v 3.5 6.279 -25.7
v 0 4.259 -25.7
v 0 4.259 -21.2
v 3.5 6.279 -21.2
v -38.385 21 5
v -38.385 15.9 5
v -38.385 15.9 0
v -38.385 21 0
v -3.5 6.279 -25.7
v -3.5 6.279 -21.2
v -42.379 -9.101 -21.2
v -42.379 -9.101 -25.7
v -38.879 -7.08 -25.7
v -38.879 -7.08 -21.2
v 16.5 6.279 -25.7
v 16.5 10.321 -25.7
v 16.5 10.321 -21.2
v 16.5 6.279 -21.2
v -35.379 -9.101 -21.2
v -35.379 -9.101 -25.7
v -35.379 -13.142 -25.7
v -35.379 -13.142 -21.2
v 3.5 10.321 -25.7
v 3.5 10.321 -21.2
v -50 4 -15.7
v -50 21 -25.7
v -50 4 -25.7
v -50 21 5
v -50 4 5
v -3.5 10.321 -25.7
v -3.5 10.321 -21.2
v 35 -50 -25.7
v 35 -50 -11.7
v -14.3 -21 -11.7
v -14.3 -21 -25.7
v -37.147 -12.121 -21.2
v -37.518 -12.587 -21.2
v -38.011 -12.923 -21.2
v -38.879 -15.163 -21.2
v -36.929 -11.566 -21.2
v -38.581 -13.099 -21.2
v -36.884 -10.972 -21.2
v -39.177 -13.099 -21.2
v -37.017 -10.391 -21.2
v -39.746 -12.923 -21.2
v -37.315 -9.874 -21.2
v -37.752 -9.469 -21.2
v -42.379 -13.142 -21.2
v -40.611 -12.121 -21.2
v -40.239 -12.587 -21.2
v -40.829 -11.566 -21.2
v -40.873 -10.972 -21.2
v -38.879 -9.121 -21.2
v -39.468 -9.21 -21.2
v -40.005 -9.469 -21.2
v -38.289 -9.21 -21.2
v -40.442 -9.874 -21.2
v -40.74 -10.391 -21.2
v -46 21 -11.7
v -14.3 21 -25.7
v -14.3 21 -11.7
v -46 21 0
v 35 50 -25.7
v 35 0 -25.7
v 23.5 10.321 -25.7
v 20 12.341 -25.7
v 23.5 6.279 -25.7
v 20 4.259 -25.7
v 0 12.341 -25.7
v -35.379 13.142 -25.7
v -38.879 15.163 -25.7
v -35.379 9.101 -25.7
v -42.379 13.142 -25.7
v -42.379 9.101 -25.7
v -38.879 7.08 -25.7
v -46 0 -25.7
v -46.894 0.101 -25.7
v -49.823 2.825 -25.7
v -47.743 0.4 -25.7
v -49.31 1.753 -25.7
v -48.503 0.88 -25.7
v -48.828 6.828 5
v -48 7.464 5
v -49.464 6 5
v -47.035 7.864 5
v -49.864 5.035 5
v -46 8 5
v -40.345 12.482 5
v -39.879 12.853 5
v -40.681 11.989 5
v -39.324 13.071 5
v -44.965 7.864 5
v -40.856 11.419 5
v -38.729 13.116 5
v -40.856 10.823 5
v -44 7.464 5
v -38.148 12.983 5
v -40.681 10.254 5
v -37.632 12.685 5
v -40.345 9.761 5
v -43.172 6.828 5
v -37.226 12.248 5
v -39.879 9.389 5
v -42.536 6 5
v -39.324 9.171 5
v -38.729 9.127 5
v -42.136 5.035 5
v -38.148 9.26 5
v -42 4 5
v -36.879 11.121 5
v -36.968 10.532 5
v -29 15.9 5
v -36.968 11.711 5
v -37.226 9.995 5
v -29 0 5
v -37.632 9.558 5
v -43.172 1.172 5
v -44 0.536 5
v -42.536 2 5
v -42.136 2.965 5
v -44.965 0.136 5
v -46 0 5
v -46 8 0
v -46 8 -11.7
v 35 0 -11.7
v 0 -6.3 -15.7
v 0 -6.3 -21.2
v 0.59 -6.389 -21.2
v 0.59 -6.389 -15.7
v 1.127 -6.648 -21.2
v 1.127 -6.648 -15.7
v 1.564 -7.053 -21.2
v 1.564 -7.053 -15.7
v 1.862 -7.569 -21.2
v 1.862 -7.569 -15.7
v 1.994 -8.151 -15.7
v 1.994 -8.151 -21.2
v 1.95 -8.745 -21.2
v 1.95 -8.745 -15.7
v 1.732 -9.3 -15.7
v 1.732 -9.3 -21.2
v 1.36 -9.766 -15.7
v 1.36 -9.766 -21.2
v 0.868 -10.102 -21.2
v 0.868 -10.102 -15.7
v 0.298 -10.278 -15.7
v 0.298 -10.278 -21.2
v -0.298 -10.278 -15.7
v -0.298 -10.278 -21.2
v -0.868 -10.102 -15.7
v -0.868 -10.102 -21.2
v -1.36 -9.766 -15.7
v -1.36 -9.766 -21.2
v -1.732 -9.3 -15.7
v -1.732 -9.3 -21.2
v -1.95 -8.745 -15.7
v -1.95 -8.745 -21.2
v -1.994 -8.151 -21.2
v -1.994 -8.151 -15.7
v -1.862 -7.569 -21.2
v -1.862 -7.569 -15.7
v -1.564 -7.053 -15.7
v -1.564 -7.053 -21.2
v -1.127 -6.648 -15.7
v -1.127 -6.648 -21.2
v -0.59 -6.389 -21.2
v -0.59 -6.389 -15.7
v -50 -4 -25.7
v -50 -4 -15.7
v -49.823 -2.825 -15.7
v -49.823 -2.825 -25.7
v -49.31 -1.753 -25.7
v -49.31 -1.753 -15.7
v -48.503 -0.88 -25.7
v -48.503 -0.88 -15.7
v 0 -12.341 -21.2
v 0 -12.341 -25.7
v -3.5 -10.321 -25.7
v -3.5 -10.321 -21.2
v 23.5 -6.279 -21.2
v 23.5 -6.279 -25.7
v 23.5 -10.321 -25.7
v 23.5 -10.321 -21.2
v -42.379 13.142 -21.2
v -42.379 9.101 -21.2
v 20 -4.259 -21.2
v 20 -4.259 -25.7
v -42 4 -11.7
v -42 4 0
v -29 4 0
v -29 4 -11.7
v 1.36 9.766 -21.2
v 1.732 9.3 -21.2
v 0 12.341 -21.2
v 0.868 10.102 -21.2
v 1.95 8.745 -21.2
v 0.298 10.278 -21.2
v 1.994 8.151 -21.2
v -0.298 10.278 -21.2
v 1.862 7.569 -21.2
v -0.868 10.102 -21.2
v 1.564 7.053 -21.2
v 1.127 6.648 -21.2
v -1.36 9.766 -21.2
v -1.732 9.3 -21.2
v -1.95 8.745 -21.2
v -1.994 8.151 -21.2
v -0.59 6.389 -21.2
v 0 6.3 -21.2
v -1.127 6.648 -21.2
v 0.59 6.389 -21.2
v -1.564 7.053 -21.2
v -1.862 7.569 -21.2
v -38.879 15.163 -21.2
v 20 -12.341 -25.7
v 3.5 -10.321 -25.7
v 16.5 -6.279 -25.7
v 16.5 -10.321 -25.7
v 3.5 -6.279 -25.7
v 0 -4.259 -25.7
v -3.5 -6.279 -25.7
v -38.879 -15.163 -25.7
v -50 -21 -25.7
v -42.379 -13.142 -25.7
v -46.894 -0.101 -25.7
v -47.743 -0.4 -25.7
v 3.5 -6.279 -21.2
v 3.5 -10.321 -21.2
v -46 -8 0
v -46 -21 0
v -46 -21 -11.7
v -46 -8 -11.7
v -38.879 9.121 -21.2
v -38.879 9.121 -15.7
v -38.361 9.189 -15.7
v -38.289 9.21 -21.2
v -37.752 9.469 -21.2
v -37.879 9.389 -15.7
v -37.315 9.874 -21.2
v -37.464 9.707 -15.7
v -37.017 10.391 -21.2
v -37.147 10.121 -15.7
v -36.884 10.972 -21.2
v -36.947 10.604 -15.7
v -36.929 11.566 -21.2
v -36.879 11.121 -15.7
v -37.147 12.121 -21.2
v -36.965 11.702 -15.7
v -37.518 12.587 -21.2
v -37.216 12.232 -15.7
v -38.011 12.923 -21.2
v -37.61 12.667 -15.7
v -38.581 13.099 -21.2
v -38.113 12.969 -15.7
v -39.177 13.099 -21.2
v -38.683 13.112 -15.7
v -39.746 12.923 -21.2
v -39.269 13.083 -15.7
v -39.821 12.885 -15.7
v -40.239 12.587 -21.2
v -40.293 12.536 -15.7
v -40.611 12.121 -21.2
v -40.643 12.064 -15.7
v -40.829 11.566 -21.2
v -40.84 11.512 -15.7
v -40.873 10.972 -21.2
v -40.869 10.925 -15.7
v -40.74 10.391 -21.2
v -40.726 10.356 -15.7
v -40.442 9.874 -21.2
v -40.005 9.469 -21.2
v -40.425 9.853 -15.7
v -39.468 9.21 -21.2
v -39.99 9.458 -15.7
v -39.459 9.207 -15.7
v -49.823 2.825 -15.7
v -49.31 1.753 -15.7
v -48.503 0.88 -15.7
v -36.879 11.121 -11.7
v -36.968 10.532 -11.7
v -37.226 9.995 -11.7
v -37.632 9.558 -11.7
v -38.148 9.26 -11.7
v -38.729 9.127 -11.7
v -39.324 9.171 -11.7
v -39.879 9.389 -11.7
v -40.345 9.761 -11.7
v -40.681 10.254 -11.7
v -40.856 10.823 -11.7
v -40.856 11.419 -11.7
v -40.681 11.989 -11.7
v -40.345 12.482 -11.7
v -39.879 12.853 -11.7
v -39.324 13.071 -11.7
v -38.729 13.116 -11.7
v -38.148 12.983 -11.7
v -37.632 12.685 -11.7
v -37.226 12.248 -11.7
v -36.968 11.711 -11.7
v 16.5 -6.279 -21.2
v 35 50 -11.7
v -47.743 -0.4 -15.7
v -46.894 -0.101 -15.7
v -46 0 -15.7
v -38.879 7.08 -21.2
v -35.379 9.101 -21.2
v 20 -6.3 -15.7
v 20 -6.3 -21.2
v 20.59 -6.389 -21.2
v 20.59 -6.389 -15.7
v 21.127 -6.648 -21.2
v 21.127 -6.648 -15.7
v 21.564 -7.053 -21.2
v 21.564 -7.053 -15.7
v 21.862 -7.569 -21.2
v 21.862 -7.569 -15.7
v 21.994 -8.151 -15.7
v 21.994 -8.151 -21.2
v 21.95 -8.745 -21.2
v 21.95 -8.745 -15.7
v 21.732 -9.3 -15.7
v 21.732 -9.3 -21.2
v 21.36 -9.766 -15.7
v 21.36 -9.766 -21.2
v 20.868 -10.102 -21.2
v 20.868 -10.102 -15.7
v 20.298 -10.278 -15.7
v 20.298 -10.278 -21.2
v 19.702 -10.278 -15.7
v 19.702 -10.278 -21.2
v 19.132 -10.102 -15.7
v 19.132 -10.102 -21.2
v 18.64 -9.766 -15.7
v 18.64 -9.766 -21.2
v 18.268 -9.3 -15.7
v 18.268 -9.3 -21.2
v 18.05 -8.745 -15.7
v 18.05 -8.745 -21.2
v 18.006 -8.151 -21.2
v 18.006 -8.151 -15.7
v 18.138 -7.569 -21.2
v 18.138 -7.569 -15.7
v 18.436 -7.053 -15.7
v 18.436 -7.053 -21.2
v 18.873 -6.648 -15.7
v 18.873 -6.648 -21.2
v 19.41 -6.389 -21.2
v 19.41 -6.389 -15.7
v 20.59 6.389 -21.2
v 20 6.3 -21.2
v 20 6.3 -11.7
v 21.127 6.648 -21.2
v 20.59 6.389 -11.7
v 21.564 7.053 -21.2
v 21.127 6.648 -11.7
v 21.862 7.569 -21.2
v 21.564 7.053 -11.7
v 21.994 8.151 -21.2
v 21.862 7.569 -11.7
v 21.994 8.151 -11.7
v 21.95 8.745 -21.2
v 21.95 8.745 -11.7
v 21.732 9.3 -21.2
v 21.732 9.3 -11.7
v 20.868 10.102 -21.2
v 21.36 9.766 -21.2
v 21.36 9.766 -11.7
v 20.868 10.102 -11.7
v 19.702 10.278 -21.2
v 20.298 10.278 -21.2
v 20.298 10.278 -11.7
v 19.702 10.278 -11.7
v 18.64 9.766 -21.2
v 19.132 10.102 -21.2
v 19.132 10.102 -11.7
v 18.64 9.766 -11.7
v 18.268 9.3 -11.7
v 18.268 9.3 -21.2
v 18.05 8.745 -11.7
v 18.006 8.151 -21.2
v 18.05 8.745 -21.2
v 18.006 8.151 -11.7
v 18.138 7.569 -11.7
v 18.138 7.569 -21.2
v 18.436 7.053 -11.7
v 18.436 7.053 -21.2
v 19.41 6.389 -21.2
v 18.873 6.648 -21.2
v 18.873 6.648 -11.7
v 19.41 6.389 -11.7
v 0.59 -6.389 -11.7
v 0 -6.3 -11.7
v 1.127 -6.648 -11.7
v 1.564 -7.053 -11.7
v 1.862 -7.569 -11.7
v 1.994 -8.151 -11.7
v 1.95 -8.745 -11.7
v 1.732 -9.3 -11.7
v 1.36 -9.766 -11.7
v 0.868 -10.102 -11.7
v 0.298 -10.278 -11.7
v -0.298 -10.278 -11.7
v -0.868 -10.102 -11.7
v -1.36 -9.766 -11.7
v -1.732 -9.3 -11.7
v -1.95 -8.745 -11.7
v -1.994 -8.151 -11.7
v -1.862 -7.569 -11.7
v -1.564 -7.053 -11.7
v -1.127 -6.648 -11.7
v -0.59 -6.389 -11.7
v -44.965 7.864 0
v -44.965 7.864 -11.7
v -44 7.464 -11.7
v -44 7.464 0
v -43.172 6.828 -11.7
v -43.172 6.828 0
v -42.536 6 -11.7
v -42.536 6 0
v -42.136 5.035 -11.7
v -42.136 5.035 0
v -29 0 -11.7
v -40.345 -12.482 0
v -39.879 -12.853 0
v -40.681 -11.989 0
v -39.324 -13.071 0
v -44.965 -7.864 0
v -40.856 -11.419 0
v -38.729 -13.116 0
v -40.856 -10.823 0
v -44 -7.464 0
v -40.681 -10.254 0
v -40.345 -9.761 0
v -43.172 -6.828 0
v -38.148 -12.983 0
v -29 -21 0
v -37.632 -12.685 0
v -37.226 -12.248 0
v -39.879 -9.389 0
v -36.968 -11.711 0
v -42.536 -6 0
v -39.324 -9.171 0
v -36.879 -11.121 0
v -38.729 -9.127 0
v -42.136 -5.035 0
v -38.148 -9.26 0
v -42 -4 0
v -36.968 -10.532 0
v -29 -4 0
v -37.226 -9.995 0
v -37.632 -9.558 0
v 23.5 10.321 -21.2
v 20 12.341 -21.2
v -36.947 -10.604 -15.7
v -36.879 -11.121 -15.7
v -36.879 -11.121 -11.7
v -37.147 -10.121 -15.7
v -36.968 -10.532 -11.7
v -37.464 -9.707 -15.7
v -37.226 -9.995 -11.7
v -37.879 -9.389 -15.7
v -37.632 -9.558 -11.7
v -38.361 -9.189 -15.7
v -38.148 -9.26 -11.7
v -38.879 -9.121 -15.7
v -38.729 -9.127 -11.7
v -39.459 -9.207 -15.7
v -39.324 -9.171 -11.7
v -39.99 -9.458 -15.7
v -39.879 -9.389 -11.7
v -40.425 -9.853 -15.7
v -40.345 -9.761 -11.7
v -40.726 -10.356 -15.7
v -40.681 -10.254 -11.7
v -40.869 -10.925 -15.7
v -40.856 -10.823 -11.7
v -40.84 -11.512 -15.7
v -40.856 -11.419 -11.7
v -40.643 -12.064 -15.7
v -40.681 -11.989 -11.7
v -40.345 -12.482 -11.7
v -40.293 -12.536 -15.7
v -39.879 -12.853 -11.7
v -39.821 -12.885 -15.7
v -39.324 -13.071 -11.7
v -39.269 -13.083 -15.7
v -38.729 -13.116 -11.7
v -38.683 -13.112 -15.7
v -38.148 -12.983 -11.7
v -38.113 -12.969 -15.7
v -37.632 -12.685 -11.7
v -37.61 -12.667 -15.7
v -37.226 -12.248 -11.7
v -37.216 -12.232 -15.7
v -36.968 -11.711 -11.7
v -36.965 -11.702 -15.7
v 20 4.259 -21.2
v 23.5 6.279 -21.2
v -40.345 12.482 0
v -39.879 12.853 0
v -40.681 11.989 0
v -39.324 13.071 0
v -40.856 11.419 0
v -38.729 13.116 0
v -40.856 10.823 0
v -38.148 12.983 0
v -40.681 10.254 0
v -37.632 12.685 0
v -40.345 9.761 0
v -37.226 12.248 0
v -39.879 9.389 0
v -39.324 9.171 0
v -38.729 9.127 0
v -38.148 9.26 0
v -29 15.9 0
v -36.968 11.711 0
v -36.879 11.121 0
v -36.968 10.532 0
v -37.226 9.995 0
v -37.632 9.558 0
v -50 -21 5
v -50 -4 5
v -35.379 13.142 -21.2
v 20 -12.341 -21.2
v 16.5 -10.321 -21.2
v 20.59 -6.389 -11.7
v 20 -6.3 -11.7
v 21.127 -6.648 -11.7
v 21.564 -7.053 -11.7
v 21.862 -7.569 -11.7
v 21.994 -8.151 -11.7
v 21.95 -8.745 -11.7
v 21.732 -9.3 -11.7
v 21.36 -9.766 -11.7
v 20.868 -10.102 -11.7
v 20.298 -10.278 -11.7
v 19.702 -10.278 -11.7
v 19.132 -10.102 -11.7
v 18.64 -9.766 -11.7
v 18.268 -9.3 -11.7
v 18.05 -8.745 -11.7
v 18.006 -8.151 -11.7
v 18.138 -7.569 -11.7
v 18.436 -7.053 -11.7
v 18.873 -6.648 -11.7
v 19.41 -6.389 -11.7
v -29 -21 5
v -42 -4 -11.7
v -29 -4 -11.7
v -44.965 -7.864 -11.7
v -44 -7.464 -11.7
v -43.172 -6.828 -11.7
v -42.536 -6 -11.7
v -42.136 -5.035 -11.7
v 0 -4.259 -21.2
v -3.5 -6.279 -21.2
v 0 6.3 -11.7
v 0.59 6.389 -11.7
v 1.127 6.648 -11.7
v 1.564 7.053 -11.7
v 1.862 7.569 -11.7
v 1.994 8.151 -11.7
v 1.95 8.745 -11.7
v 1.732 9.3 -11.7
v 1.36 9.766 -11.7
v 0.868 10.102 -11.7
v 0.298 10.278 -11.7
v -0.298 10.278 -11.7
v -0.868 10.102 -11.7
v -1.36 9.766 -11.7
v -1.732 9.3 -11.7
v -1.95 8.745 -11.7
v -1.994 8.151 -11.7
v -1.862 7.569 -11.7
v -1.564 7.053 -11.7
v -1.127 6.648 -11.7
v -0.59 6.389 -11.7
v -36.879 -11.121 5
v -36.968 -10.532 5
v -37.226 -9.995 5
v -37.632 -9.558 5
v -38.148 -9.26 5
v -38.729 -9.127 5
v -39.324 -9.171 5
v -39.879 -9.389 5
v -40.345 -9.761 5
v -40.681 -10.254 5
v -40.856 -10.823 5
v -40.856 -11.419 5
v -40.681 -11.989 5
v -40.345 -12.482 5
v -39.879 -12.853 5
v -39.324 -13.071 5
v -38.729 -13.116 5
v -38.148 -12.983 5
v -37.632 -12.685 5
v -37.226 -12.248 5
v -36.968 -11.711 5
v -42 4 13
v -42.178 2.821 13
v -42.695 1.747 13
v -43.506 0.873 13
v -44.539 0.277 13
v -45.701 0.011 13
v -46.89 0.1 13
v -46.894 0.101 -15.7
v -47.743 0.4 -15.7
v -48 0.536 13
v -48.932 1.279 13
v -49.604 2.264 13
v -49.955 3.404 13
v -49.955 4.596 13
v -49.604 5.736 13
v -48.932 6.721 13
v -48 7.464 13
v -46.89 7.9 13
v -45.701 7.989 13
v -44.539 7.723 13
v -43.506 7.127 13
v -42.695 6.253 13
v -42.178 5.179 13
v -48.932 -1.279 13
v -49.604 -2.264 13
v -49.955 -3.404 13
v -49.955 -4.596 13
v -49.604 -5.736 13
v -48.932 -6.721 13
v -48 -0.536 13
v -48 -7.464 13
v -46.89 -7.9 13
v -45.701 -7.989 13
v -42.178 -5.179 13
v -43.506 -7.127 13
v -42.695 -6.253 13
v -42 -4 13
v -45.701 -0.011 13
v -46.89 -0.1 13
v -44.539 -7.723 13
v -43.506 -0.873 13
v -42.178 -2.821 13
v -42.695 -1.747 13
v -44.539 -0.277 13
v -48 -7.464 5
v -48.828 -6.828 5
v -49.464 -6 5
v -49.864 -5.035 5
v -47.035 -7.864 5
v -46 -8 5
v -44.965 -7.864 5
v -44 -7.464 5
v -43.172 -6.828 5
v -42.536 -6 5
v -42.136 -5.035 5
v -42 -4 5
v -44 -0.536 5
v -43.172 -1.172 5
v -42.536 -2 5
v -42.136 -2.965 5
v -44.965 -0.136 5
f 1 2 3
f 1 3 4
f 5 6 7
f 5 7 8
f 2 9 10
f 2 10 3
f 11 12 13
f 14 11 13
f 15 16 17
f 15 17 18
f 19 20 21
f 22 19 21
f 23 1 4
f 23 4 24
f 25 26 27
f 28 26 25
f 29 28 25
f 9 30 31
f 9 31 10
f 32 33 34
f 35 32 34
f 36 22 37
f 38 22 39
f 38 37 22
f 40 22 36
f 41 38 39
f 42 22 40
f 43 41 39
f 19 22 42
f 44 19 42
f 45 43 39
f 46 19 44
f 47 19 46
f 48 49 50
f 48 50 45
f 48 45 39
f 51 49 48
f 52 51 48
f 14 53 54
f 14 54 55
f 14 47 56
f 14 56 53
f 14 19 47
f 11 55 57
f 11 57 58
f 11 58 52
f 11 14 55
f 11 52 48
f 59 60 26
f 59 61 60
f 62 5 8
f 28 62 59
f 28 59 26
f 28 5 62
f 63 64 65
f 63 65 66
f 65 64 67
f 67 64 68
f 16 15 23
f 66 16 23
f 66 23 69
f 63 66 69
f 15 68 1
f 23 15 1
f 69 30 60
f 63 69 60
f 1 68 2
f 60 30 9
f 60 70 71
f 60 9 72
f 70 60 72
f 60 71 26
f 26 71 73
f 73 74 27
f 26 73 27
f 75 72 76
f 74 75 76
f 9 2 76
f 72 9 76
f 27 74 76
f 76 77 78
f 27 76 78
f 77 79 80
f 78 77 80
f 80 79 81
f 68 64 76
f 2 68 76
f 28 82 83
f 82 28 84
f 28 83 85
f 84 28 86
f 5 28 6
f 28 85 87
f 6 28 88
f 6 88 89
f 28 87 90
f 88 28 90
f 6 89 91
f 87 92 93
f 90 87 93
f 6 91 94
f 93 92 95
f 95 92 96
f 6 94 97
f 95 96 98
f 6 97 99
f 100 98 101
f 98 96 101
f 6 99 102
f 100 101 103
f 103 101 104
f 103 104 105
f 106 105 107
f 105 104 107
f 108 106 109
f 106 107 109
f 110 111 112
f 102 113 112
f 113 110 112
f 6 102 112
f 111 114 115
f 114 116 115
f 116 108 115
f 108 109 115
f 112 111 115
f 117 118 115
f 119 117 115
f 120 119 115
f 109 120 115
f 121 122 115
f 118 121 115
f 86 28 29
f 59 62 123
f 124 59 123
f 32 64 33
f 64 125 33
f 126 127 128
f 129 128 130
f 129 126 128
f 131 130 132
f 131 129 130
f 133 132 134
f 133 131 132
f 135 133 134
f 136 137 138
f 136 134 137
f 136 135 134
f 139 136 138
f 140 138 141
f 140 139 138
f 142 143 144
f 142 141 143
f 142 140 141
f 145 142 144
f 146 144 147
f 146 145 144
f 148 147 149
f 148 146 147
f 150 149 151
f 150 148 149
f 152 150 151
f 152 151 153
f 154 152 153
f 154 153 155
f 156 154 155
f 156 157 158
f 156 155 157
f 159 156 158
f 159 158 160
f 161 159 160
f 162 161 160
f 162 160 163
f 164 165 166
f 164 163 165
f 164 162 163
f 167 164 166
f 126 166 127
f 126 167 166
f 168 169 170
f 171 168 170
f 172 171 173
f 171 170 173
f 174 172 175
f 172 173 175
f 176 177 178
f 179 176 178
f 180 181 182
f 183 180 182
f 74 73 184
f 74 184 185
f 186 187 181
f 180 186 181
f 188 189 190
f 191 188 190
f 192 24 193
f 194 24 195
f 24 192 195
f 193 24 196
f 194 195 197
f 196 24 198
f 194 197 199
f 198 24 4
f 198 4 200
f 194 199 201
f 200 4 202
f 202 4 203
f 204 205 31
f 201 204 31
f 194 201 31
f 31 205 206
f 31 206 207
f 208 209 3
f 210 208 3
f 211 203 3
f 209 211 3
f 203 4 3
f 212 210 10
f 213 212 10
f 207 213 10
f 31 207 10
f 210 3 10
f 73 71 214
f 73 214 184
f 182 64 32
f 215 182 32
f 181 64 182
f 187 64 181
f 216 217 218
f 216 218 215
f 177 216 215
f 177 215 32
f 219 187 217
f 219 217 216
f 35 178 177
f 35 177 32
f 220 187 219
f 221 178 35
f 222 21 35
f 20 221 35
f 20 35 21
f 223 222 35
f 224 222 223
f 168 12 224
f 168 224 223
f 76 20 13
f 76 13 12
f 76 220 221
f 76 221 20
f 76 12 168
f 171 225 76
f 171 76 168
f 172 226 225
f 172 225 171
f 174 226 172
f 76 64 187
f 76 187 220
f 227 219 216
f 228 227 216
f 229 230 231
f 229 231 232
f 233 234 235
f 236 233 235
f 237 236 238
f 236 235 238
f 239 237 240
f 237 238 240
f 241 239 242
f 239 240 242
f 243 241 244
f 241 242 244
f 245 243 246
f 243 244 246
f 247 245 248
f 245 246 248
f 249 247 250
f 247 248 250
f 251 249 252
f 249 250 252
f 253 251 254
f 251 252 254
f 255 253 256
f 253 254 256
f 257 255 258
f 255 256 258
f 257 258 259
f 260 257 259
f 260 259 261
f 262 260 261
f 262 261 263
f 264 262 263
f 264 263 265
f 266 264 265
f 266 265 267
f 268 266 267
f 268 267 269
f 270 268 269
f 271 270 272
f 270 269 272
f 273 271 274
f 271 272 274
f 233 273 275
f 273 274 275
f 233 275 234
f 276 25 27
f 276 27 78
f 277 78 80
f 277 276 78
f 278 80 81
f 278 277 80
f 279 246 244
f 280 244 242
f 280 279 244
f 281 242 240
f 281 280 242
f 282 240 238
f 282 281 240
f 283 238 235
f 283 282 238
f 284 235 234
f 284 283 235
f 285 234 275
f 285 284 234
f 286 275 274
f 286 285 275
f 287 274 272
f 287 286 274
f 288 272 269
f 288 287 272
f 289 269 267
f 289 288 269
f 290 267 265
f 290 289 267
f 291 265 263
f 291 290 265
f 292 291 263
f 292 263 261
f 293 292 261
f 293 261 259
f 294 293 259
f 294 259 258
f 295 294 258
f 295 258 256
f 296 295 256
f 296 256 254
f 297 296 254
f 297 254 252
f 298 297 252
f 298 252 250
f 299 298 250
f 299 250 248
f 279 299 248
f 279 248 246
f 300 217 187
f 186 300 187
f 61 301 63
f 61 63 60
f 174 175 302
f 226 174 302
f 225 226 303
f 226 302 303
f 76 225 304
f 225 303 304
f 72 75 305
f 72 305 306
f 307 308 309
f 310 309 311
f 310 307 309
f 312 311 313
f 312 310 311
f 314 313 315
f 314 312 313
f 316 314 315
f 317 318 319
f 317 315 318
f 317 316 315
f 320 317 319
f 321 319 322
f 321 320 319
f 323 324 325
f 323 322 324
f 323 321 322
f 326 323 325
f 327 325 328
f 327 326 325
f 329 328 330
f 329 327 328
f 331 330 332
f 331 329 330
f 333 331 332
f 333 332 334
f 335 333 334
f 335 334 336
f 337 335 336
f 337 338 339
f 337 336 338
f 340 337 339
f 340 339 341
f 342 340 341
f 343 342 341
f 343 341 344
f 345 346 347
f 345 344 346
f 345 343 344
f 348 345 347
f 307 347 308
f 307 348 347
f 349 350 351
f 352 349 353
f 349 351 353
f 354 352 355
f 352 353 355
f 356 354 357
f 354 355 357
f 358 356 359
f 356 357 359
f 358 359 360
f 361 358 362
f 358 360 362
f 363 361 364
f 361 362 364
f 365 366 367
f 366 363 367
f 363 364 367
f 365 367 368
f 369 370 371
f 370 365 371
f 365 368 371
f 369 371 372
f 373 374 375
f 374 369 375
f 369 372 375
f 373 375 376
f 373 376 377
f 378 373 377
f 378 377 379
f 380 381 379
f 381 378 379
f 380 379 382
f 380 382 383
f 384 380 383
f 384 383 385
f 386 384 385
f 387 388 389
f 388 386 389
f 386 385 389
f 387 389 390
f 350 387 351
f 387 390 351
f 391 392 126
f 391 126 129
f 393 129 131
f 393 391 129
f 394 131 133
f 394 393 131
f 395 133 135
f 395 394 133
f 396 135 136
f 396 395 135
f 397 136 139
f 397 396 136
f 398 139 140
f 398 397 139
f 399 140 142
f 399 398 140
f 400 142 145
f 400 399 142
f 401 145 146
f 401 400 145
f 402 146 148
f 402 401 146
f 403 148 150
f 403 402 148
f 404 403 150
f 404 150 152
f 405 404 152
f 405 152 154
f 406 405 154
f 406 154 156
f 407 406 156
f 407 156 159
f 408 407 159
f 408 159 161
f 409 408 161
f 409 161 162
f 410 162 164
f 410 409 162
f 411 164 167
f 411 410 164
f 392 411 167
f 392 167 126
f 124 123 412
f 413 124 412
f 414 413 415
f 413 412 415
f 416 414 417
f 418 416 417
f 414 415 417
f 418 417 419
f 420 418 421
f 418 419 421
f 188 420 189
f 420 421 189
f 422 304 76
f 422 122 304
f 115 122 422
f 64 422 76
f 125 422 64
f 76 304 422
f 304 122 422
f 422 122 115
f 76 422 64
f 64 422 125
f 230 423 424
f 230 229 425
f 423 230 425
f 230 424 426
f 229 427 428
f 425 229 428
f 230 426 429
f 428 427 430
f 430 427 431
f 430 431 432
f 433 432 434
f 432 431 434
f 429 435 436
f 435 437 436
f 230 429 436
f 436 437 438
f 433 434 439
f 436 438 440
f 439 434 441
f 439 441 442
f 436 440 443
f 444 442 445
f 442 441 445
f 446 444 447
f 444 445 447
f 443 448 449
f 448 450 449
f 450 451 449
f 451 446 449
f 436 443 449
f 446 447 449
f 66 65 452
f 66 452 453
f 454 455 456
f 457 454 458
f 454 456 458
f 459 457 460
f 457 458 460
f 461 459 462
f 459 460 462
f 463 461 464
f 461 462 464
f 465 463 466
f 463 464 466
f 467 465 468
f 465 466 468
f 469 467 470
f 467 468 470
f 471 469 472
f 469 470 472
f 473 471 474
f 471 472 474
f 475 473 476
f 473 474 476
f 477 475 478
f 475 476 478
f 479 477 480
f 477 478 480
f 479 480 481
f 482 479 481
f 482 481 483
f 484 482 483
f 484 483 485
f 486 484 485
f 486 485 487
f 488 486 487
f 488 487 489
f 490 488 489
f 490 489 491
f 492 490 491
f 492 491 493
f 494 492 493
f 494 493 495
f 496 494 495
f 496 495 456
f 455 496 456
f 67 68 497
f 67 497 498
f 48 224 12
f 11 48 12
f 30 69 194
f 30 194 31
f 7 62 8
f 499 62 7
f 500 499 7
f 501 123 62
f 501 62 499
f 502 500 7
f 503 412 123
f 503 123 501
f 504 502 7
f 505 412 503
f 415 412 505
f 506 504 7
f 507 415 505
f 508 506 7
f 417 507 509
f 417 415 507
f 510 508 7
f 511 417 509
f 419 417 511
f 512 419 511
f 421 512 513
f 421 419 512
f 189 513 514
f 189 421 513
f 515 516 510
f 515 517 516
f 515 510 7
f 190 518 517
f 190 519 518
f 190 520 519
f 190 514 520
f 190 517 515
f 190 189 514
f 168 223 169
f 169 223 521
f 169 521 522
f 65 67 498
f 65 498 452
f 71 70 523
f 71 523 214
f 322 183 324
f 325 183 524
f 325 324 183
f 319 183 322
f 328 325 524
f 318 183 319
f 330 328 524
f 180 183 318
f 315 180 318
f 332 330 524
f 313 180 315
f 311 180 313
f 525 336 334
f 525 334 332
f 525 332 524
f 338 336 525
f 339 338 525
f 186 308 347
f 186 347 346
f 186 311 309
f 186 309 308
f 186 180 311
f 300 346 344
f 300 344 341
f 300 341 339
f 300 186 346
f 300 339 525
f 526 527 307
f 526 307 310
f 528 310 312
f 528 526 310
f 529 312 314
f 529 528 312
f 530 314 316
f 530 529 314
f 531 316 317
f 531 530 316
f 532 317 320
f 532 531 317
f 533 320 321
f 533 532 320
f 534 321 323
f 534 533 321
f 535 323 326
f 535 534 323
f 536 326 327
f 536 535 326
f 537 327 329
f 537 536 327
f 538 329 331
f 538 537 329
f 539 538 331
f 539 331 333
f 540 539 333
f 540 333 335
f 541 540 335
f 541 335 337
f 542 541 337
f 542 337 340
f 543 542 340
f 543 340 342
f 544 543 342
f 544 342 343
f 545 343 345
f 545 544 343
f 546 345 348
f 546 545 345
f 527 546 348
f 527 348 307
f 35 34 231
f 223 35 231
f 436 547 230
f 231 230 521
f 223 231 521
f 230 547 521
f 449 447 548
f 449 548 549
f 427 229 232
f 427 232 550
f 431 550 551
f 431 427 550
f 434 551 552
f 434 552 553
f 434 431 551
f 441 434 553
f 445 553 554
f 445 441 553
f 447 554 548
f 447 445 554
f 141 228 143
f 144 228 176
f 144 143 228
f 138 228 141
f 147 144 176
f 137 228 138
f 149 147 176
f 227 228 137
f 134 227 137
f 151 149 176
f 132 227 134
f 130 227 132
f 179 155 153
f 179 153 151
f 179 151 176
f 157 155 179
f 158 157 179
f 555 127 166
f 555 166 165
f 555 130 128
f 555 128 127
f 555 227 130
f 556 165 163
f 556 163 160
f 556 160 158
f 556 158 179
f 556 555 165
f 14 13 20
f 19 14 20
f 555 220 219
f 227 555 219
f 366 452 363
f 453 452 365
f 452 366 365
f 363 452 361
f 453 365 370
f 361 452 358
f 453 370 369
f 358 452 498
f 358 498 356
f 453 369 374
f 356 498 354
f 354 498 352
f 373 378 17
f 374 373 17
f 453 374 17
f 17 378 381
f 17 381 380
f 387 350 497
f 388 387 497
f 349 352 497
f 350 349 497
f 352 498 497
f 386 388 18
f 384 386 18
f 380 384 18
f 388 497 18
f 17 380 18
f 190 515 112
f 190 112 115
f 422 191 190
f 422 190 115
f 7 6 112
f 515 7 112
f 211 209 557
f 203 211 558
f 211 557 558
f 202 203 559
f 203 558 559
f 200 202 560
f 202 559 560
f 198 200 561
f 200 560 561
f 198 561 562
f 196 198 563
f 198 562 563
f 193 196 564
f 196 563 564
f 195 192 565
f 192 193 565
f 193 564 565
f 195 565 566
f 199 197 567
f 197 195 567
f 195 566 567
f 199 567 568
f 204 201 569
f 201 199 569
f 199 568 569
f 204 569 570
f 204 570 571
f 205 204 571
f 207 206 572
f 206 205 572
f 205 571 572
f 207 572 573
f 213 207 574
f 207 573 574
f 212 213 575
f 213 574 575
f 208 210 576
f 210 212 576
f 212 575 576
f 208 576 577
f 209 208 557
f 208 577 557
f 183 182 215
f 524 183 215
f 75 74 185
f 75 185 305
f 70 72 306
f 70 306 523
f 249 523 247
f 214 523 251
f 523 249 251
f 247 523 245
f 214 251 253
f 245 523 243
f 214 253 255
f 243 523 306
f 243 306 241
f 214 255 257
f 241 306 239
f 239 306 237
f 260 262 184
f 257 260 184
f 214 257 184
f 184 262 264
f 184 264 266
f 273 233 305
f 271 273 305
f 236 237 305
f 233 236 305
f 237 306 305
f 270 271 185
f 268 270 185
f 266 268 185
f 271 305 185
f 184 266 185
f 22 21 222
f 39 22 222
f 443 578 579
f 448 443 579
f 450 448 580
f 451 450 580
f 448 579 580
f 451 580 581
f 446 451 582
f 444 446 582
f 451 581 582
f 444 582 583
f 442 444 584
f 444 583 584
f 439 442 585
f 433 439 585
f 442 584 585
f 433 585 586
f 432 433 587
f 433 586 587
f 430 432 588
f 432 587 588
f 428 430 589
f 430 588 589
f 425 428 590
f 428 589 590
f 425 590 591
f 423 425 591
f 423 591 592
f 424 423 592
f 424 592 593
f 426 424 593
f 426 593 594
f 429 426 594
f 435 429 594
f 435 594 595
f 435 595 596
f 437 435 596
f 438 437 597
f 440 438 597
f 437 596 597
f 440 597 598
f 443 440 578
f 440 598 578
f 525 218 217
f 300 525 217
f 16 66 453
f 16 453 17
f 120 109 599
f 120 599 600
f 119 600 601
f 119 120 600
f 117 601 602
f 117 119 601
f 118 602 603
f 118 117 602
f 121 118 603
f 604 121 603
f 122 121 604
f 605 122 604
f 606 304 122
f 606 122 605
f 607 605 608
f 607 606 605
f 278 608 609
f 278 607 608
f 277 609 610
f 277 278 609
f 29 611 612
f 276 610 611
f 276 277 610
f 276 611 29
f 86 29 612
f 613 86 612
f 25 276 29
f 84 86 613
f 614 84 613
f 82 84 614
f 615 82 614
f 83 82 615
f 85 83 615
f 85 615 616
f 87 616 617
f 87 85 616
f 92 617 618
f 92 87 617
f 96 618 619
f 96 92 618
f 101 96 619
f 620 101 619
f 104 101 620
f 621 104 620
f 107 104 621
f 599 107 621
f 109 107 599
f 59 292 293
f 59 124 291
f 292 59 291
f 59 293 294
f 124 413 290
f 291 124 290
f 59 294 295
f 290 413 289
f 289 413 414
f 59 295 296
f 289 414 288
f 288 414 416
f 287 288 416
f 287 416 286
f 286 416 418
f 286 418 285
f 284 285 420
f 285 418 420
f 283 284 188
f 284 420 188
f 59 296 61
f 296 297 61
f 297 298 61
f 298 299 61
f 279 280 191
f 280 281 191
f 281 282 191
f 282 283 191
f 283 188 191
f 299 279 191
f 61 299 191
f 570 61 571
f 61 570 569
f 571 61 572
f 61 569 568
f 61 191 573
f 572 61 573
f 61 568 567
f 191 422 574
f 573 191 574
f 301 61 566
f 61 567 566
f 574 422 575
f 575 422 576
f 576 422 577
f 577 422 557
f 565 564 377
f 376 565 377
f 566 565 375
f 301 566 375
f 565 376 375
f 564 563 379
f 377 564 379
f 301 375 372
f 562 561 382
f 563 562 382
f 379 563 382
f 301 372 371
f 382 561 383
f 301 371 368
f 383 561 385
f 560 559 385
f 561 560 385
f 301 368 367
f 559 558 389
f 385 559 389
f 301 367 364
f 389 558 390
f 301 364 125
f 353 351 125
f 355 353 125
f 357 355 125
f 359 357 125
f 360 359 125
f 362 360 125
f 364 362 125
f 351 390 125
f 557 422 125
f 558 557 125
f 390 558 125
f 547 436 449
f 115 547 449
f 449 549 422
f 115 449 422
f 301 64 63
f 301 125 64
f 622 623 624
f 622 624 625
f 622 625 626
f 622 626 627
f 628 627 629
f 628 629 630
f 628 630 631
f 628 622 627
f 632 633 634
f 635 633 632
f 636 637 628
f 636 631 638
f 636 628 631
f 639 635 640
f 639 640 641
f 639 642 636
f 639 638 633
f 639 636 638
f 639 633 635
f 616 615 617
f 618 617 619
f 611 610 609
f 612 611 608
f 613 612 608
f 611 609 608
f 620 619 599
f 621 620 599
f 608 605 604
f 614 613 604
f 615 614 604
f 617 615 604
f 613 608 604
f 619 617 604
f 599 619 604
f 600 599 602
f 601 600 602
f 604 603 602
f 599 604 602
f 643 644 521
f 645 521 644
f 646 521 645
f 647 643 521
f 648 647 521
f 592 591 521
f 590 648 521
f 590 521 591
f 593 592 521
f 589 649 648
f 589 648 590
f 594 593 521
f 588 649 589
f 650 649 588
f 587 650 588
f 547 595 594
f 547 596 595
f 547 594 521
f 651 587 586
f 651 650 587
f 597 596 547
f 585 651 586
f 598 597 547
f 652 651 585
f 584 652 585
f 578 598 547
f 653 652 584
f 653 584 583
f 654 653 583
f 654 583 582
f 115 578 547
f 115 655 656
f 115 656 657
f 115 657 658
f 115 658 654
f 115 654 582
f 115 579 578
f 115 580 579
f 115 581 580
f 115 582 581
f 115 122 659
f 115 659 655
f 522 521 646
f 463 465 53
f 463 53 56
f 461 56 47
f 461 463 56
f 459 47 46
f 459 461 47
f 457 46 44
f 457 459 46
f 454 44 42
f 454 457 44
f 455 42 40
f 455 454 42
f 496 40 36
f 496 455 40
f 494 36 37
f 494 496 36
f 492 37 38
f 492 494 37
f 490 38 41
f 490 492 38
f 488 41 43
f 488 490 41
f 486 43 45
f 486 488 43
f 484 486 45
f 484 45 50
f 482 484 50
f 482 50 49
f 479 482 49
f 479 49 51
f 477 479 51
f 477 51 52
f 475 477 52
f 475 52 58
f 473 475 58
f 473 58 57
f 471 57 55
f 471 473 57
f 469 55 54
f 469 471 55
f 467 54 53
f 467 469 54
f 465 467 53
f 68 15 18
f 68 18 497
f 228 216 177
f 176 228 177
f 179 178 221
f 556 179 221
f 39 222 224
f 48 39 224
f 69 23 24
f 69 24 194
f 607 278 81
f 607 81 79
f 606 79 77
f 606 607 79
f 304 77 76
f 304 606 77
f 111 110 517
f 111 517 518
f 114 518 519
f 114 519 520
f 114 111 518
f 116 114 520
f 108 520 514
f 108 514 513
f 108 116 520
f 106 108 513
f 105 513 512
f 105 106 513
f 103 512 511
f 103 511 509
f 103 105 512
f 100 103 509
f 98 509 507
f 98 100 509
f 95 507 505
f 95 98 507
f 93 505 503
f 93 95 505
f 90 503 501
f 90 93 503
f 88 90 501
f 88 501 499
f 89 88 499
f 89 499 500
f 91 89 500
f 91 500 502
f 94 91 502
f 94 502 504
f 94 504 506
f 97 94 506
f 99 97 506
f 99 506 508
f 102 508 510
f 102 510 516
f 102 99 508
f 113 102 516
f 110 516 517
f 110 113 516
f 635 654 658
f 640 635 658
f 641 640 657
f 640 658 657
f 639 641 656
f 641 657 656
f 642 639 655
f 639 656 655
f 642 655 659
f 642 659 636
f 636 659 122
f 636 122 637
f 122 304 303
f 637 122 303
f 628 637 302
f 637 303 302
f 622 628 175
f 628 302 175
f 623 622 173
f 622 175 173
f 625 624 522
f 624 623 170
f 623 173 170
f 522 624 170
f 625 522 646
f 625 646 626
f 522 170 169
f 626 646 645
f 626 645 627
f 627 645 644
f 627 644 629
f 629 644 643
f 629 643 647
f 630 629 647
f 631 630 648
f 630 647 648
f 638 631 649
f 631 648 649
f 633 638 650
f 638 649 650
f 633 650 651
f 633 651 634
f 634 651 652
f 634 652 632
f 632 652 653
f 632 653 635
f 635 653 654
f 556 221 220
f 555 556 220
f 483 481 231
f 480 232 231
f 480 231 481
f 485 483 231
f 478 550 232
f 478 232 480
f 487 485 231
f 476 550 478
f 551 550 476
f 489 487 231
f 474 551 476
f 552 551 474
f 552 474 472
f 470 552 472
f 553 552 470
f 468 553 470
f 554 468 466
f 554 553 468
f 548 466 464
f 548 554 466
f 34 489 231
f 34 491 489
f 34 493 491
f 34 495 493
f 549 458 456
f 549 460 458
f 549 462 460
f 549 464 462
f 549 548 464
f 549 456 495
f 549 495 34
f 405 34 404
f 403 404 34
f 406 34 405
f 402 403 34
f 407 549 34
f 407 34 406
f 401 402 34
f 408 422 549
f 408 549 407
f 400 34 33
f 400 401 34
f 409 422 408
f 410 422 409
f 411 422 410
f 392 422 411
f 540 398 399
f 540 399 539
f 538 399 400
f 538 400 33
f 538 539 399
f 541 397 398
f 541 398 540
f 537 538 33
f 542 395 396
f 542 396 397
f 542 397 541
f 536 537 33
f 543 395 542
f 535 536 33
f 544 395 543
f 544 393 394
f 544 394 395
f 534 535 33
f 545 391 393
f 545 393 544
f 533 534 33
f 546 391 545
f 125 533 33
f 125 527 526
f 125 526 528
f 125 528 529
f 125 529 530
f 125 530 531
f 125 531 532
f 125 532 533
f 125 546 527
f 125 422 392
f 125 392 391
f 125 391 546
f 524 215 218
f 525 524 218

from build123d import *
from build123d.topology import SkipClean

# Parameters (mm, degrees)
BOSS_EXTRUDE1_DEPTH     = 11.7
BOSS_EXTRUDE4_START     = 8
SKETCH1_6_R             = 4
BOSS_EXTRUDE4_DEPTH     = 8
BOSS_EXTRUDE5_START     = -11.7
SKETCH1_7_R             = 2
BOSS_EXTRUDE5_DEPTH     = 4
BOSS_EXTRUDE6_START     = 5
SKETCH1_8_R             = 2
BOSS_EXTRUDE6_DEPTH     = 5
BOSS_EXTRUDE7_START     = 8
BOSS_EXTRUDE7_OUTLINE_R = 4
BOSS_EXTRUDE7_DEPTH     = 5
SKETCH2_W               = 7
SKETCH2_H               = 10
SKETCH2_H_2             = 7
SKETCH2_W_2             = 10
BOSS_EXTRUDE8_DEPTH     = 5
BOSS_EXTRUDE9_START     = -20.7
SKETCH2_3_W             = 7
SKETCH2_3_H             = 10
SKETCH2_3_W_2           = 10
SKETCH2_3_H_2           = 7
BOSS_EXTRUDE9_DEPTH     = 4
SKETCH4_R               = 2
BOSS_EXTRUDE11_DEPTH    = 10
BOSS_EXTRUDE12_START    = -4
SKETCH4_3_R             = 2
BOSS_EXTRUDE12_DEPTH    = 4
SKETCH4_4_R             = 2
BOSS_EXTRUDE13_DEPTH    = 10
CUT_EXTRUDE1_DEPTH      = 4.5
SKETCH6_W               = 9.384536498
SKETCH6_H               = 5.1
CUT_EXTRUDE2_DEPTH      = 10


# Read off the part's stored shape, not the designer's step: Boss-Extrude7
with BuildPart() as part:
    # Sketch1 → Boss-Extrude1 (new body)
    with BuildSketch(Plane.XY):
        with BuildLine():
            Line((-36, -4), (-29, -4))
            Line((-29, -4), (-29, 0))
            Line((-29, 0), (-46, 0))
            ThreePointArc((-46, 0), (-43.171572875, -1.171572875), (-42, -4))
            Line((-42, -4), (-36, -4))
        make_face()
        with BuildLine():
            ThreePointArc((-46, -8), (-43.171572875, -6.828427125), (-42, -4))
            Line((-42, -4), (-46, -4))
            Line((-46, -4), (-46, -8))
        make_face()
        with BuildLine():
            Line((-46, -4), (-42, -4))
            ThreePointArc((-42, -4), (-43.171572875, -1.171572875), (-46, 0))
            Line((-46, 0), (-46, -4))
        make_face()
        with BuildLine():
            Line((-46, -4), (-46, 0))
            ThreePointArc((-46, 0), (-48.828427125, -1.171572875), (-50, -4))
            Line((-50, -4), (-46, -4))
        make_face()
        with BuildLine():
            Line((-46, -8), (-46, -4))
            Line((-46, -4), (-50, -4))
            ThreePointArc((-50, -4), (-48.828427125, -6.828427125), (-46, -8))
        make_face()
        with BuildLine():
            Line((-46, -14), (-46, -8))
            ThreePointArc((-46, -8), (-48.828427125, -6.828427125), (-50, -4))
            Line((-50, -4), (-50, -21))
            Line((-50, -21), (-46, -21))
            Line((-46, -21), (-46, -14))
        make_face()
    extrude(amount=-BOSS_EXTRUDE1_DEPTH)

    # Sketch1<6> → Boss-Extrude4 (add)
    with BuildSketch(Plane.XY.offset(BOSS_EXTRUDE4_START)):
        with Locations((-46, -4)):
            Circle(SKETCH1_6_R)
    extrude(amount=-BOSS_EXTRUDE4_DEPTH)

    # Sketch1<7> → Boss-Extrude5 (add)
    with SkipClean():  # the faces are left unmerged after this step: merging them gives an invalid solid
        with BuildSketch(Plane.XY.offset(BOSS_EXTRUDE5_START)):
            with BuildLine():
                Line((-36, -4), (-29, -4))
                Line((-29, -4), (-29, 0))
                Line((-29, 0), (-46, 0))
                ThreePointArc((-46, 0), (-48.828427125, -1.171572875), (-50, -4))
                Line((-50, -4), (-50, -21))
                Line((-50, -21), (-46, -21))
                Line((-46, -21), (-46, -14))
                Line((-46, -14), (-36, -14))
                Line((-36, -14), (-36, -4))
            make_face()
            with Locations((-38.878679656, -11.121320344)):
                Circle(SKETCH1_7_R, mode=Mode.SUBTRACT)
        extrude(amount=-BOSS_EXTRUDE5_DEPTH)

    # Sketch1<8> → Boss-Extrude6 (add)
    # profile 1 of 3: a face of its own
    with BuildSketch(Plane.XY.offset(BOSS_EXTRUDE6_START)):
        with BuildLine():
            Line((-46, -14), (-46, -8))
            ThreePointArc((-46, -8), (-48.828427125, -6.828427125), (-50, -4))
            Line((-50, -4), (-50, -21))
            Line((-50, -21), (-46, -21))
            Line((-46, -21), (-46, -14))
        make_face()
    # profile 2 of 3: a face of its own
    with BuildSketch(Plane.XY.offset(BOSS_EXTRUDE6_START)):
        with BuildLine():
            Line((-36, -14), (-36, -4))
            Line((-36, -4), (-42, -4))
            ThreePointArc((-42, -4), (-43.171572875, -6.828427125), (-46, -8))
            Line((-46, -8), (-46, -14))
            Line((-46, -14), (-36, -14))
        make_face()
        with Locations((-38.878679656, -11.121320344)):
            Circle(SKETCH1_8_R, mode=Mode.SUBTRACT)
    # profile 3 of 3: a face of its own
    with BuildSketch(Plane.XY.offset(BOSS_EXTRUDE6_START)):
        with BuildLine():
            Line((-36, -4), (-29, -4))
            Line((-29, -4), (-29, 0))
            Line((-29, 0), (-46, 0))
            ThreePointArc((-46, 0), (-43.171572875, -1.171572875), (-42, -4))
            Line((-42, -4), (-36, -4))
        make_face()
    extrude(amount=-BOSS_EXTRUDE6_DEPTH)

    # Boss-Extrude7 outline → Boss-Extrude7 (add)
    with BuildSketch(Plane.XY.offset(BOSS_EXTRUDE7_START)):
        with Locations((-46, -4)):
            Circle(BOSS_EXTRUDE7_OUTLINE_R)
    extrude(amount=BOSS_EXTRUDE7_DEPTH)

    # Sketch2 → Boss-Extrude8 (add)
    with BuildSketch(Plane.XY.offset(5)):
        with Locations((-32.5, -9)):
            Rectangle(SKETCH2_W, SKETCH2_H)
        with Locations((-32.5, -17.5)):
            Rectangle(SKETCH2_W, SKETCH2_H_2)
        with Locations((-41, -17.5)):
            Rectangle(SKETCH2_W_2, SKETCH2_H_2)
    extrude(amount=-BOSS_EXTRUDE8_DEPTH)

    # Sketch2<3> → Boss-Extrude9 (add)
    with BuildSketch(Plane.XY.offset(5).offset(BOSS_EXTRUDE9_START)):
        with Locations((-32.5, -9)):
            Rectangle(SKETCH2_3_W, SKETCH2_3_H)
        with Locations((-41, -17.5)):
            Rectangle(SKETCH2_3_W_2, SKETCH2_3_H_2)
        with Locations((-32.5, -17.5)):
            Rectangle(SKETCH2_3_W, SKETCH2_3_H_2)
    extrude(amount=BOSS_EXTRUDE9_DEPTH)

    # Sketch4 → Boss-Extrude11 (add)
    with SkipClean():  # the faces are left unmerged after this step: merging them gives an invalid solid
        with BuildSketch(Plane(origin=(0, 0, -15.7), x_dir=(-1, 0, 0), z_dir=(0, 0, -1))):
            with BuildLine():
                Line((46, 0), (-35, 0))
                Line((-35, 0), (-35, -50))
                Line((-35, -50), (14.3, -21))
                Line((14.3, -21), (48.503491121, -0.88029934))
                ThreePointArc((48.503491121, -0.88029934), (47.326875533, -0.226486873), (46, 0))
            make_face()
            with Locations(Location((-20, -8.3, 0), (0, 0, 90))):
                Circle(SKETCH4_R, mode=Mode.SUBTRACT)
            with Locations(Location((0, -8.3, 0), (0, 0, 90))):
                Circle(SKETCH4_R, mode=Mode.SUBTRACT)
        extrude(amount=BOSS_EXTRUDE11_DEPTH)

    # Sketch4<3> → Boss-Extrude12 (add)
    with SkipClean():  # the faces are left unmerged after this step: merging them gives an invalid solid
        with BuildSketch(Plane(origin=(0, 0, -15.7), x_dir=(-1, 0, 0), z_dir=(0, 0, -1)).offset(BOSS_EXTRUDE12_START)):
            Polygon((29, 0), (-35, 0), (-35, -50), (14.3, -21), (29, -21), align=None)
            with Locations(Location((-20, -8.3, 0), (0, 0, 90))):
                Circle(SKETCH4_3_R, mode=Mode.SUBTRACT)
            with Locations(Location((0, -8.3, 0), (0, 0, 90))):
                Circle(SKETCH4_3_R, mode=Mode.SUBTRACT)
        extrude(amount=BOSS_EXTRUDE12_DEPTH)

    # Sketch4<4> → Boss-Extrude13 (add)
    # profile 1 of 2: a face of its own
    with SkipClean():  # the faces are left unmerged after this step: merging them gives an invalid solid
        with BuildSketch(Plane(origin=(0, 0, -15.7), x_dir=(-1, 0, 0), z_dir=(0, 0, -1))):
            with BuildLine():
                Line((48.503491121, -0.88029934), (29, -12.352941176))
                Line((29, -12.352941176), (29, -21))
                Line((29, -21), (50, -21))
                Line((50, -21), (50, -4))
                ThreePointArc((50, -4), (49.606519408, -2.269965966), (48.503491121, -0.88029934))
            make_face()
            with Locations(Location((38.878679656, -11.121320344, 0), (0, 0, 90))):
                Circle(SKETCH4_4_R, mode=Mode.SUBTRACT)
        # profile 2 of 2: a face of its own
        with BuildSketch(Plane(origin=(0, 0, -15.7), x_dir=(-1, 0, 0), z_dir=(0, 0, -1))):
            Polygon((29, -21), (29, -12.352941176), (14.3, -21), align=None)
        extrude(amount=BOSS_EXTRUDE13_DEPTH)
    add(part.part.scale(1), mode=Mode.REPLACE)  # the faces are merged on a copy

    # Sketch5 → Cut-Extrude1 (cut)
    with BuildSketch(Plane(origin=(0, 0, -25.7), x_dir=(-1, 0, 0), z_dir=(0, 0, -1))):
        Polygon((35.378679656, -9.100594401), (35.378679656, -13.142046286), (38.878679656, -15.162772228), (42.378679656, -13.142046286), (42.378679656, -9.100594401), (38.878679656, -7.079868459), align=None)
        Polygon((-3.5, -6.279274058), (-3.5, -10.320725942), (0, -12.341451884), (3.5, -10.320725942), (3.5, -6.279274058), (0, -4.258548116), align=None)
        Polygon((-16.5, -10.320725942), (-16.5, -6.279274058), (-20, -4.258548116), (-23.5, -6.279274058), (-23.5, -10.320725942), (-20, -12.341451884), align=None)
    extrude(amount=-CUT_EXTRUDE1_DEPTH, mode=Mode.SUBTRACT)


with BuildPart() as body_2:
    # Mirror2: mirrored copy
    add(part.part.mirror(Plane.ZX))

    # Sketch6 → Cut-Extrude2 (cut)
    with SkipClean():  # the faces are left unmerged after this step: merging them gives an invalid solid
        with BuildSketch(Plane.XY.offset(5)):
            with Locations((-33.692268249, 18.45)):
                Rectangle(SKETCH6_W, SKETCH6_H)
        extrude(amount=-CUT_EXTRUDE2_DEPTH, mode=Mode.SUBTRACT)


solid = Compound([part.part, body_2.part])
